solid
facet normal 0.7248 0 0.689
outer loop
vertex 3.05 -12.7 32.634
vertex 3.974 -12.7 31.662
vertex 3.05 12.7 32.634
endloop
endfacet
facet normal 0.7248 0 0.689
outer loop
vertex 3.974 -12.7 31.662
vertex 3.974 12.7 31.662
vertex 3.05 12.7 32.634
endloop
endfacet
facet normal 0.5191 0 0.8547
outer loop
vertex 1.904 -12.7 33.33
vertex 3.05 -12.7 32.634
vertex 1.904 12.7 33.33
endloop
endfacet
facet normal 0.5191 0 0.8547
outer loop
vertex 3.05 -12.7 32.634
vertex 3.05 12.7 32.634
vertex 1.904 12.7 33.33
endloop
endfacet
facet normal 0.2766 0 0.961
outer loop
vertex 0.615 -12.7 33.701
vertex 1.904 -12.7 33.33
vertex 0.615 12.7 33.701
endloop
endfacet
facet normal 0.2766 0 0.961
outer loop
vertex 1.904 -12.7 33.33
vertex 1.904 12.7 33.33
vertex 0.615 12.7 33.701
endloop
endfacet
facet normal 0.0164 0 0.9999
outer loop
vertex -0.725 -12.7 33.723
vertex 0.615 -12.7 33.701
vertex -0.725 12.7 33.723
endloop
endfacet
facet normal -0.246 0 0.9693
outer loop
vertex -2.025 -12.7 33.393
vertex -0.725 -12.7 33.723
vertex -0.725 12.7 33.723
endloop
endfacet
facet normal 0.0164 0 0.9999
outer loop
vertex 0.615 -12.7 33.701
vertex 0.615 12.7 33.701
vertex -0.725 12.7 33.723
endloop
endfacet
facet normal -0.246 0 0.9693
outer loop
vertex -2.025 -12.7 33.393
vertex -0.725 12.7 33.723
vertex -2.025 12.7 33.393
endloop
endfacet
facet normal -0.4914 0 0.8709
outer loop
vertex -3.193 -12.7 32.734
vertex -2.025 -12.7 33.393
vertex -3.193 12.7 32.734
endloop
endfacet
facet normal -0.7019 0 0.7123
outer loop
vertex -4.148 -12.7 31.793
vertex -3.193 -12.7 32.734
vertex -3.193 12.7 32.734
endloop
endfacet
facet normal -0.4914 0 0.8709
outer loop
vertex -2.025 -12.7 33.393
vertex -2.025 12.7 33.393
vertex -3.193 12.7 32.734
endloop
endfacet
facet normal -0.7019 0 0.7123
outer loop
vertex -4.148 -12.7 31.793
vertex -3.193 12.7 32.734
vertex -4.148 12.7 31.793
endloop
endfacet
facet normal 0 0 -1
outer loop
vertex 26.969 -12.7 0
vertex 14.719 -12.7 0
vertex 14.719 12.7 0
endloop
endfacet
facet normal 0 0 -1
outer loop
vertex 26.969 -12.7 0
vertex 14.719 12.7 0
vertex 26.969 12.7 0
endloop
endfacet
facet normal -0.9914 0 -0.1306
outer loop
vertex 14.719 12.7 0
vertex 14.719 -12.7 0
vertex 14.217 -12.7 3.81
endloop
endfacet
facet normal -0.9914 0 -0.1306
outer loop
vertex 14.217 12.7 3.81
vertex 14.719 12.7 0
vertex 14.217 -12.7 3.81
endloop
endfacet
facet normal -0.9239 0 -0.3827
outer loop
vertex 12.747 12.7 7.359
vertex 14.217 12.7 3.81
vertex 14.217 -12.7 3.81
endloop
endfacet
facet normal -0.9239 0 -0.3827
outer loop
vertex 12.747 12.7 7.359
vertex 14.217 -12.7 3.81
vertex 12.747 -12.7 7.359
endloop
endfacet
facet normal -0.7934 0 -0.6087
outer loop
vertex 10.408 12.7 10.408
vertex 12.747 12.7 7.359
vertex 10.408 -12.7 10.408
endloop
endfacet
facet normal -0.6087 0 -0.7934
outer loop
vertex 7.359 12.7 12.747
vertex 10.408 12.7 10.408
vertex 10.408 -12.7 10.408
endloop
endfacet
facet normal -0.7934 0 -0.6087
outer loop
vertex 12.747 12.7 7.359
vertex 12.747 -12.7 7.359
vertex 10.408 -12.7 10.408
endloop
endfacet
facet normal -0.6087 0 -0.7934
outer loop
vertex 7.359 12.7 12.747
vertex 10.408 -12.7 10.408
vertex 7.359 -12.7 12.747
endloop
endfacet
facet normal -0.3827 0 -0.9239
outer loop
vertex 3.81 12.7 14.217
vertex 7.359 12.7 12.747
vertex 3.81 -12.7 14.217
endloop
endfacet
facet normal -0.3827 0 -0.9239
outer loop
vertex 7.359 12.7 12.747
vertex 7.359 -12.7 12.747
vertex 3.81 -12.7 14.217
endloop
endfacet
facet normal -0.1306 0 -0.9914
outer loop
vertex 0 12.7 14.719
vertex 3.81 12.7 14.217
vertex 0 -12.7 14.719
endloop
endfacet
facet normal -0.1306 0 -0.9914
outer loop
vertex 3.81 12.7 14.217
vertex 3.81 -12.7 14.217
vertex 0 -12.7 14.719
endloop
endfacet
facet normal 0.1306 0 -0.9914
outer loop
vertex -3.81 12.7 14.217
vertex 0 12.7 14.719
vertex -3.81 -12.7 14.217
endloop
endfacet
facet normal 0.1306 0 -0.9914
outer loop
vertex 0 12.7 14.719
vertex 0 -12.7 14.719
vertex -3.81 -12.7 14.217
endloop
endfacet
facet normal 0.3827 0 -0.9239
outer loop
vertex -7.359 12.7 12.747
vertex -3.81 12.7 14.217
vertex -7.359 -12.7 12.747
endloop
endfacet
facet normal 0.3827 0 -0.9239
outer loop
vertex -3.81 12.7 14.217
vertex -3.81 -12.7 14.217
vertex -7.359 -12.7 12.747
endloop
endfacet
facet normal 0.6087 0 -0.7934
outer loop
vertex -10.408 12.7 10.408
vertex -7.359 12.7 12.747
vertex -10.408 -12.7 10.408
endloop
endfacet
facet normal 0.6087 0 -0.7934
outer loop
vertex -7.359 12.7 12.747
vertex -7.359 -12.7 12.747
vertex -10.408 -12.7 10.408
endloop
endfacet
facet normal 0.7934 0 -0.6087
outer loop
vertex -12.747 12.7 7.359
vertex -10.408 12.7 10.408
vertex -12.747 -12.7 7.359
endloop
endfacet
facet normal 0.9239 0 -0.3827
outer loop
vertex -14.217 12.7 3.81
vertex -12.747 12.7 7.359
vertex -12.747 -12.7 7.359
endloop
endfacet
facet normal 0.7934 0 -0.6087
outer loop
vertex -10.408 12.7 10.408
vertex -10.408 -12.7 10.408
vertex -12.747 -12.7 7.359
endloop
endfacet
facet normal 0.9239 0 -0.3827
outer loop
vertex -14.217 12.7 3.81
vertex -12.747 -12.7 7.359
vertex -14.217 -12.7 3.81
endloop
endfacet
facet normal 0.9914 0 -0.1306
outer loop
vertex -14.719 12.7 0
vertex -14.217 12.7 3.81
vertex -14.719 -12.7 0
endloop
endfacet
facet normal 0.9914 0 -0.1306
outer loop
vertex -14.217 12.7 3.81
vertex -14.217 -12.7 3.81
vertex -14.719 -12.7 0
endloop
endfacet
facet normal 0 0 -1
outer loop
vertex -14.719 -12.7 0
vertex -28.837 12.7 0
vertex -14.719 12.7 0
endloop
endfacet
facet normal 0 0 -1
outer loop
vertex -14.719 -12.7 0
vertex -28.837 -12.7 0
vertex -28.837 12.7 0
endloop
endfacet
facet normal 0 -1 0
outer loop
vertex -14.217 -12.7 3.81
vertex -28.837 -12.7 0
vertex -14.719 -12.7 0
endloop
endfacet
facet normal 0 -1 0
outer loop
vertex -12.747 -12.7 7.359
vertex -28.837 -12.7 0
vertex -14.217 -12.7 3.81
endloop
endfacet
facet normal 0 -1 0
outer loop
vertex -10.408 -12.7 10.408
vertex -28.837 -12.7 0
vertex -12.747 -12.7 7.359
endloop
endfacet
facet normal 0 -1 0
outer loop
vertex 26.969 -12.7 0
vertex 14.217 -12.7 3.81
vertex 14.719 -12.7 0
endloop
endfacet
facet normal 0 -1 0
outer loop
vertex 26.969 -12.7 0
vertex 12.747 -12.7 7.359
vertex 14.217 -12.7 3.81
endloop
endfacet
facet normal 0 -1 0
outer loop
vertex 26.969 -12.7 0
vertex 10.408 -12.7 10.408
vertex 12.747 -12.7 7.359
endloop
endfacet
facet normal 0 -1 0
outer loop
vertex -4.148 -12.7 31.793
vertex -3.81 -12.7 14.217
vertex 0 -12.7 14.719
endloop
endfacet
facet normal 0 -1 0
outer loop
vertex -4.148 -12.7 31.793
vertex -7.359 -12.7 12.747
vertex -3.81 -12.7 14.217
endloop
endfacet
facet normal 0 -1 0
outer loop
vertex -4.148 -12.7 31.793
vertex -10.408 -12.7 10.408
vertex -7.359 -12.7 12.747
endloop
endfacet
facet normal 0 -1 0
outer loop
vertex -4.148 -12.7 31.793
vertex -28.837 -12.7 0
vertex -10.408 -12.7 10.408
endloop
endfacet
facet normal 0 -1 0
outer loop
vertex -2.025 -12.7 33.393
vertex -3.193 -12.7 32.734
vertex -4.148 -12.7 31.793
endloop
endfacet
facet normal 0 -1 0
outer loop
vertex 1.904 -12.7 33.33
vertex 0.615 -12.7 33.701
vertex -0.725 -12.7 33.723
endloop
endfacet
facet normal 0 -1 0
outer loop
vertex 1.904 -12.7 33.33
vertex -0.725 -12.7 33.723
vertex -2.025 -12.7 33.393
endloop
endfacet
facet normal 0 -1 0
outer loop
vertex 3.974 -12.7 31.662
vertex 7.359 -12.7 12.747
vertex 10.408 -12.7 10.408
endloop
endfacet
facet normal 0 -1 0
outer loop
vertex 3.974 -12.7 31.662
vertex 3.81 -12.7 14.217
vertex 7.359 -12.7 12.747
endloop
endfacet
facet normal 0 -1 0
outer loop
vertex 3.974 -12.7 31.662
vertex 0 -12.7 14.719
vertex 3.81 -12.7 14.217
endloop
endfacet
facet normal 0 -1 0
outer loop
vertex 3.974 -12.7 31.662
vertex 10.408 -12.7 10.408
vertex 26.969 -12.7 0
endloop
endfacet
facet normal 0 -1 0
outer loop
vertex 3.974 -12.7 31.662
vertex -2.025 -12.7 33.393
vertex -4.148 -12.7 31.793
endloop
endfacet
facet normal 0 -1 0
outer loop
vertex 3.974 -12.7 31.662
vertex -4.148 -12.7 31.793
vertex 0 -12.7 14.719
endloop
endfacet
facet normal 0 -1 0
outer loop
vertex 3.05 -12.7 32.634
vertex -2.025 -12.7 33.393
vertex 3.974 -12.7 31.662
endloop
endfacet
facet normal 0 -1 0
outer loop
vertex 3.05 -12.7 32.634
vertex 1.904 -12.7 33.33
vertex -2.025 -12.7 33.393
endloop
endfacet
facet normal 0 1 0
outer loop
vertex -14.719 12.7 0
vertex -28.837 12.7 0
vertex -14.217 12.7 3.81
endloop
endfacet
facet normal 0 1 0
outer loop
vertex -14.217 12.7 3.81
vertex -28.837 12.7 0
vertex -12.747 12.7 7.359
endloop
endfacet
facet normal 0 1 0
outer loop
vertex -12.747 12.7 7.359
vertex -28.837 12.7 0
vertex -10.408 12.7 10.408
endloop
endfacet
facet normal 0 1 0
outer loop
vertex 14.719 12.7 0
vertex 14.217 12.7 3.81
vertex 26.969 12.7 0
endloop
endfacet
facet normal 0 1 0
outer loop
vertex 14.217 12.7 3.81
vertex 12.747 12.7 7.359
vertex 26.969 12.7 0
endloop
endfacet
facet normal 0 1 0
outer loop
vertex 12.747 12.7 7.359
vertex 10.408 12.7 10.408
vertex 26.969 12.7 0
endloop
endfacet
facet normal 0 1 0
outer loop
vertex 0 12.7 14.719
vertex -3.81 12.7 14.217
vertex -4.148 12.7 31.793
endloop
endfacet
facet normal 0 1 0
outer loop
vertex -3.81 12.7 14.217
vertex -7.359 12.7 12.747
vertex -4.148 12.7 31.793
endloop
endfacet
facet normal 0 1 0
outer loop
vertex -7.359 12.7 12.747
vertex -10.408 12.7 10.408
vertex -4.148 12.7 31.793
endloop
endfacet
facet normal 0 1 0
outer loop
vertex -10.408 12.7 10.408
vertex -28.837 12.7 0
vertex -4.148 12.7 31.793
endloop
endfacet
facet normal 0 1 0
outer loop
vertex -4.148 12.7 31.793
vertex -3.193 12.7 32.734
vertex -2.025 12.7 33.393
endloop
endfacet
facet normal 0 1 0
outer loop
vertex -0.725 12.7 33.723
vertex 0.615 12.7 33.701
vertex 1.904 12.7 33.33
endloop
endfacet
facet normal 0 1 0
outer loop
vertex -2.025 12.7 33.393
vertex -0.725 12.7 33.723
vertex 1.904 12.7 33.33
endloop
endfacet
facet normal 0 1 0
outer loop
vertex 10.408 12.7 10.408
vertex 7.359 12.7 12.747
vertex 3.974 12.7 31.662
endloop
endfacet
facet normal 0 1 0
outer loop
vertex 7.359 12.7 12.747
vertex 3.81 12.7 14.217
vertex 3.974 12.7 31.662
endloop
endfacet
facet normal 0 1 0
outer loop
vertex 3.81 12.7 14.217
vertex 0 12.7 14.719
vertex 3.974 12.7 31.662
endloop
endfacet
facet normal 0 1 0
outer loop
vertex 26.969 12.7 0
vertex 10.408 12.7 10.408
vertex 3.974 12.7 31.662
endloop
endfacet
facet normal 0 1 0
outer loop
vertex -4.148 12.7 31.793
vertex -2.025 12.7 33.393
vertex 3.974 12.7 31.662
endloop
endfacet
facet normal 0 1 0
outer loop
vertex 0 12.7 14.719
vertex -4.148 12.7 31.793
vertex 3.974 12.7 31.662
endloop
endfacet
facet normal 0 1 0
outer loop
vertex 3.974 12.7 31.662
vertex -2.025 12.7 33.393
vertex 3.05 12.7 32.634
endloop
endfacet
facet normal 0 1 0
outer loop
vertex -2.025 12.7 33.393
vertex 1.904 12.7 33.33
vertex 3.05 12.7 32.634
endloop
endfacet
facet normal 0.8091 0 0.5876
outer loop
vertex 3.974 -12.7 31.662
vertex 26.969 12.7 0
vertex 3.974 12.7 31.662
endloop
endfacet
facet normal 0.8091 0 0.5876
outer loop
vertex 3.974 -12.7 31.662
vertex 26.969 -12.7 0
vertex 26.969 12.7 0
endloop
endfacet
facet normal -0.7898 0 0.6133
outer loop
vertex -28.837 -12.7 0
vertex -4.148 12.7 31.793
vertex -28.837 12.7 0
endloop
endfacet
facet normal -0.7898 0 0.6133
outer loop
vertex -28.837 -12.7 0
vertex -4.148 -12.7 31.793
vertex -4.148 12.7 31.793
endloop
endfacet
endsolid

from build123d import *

# Parameters (mm, degrees)
F1_DEPTH = 12.7
F2_R     = 14.718879
F3_DEPTH = 22.605523
F4_R     = 5.08


with BuildPart() as f1:
    # F0 (on Front) → F1 (new body, symmetric)
    with BuildSketch(Plane.XZ):
        Polygon((-28.836578, 0), (0, 0), (26.969403, 0), (0, 37.134841), align=None)
    extrude(amount=F1_DEPTH, both=True)

    # F2 (on Front) → F3 (cut, symmetric)
    with BuildSketch(Plane.XZ):
        Circle(F2_R)
    extrude(amount=F3_DEPTH, both=True, mode=Mode.SUBTRACT)

    # F4
    f4_edges = [f1.edges().sort_by_distance(p)[0] for p in [
        (0, 0, 37.134841),
    ]]
    fillet(f4_edges, radius=F4_R)


solid = f1.part
